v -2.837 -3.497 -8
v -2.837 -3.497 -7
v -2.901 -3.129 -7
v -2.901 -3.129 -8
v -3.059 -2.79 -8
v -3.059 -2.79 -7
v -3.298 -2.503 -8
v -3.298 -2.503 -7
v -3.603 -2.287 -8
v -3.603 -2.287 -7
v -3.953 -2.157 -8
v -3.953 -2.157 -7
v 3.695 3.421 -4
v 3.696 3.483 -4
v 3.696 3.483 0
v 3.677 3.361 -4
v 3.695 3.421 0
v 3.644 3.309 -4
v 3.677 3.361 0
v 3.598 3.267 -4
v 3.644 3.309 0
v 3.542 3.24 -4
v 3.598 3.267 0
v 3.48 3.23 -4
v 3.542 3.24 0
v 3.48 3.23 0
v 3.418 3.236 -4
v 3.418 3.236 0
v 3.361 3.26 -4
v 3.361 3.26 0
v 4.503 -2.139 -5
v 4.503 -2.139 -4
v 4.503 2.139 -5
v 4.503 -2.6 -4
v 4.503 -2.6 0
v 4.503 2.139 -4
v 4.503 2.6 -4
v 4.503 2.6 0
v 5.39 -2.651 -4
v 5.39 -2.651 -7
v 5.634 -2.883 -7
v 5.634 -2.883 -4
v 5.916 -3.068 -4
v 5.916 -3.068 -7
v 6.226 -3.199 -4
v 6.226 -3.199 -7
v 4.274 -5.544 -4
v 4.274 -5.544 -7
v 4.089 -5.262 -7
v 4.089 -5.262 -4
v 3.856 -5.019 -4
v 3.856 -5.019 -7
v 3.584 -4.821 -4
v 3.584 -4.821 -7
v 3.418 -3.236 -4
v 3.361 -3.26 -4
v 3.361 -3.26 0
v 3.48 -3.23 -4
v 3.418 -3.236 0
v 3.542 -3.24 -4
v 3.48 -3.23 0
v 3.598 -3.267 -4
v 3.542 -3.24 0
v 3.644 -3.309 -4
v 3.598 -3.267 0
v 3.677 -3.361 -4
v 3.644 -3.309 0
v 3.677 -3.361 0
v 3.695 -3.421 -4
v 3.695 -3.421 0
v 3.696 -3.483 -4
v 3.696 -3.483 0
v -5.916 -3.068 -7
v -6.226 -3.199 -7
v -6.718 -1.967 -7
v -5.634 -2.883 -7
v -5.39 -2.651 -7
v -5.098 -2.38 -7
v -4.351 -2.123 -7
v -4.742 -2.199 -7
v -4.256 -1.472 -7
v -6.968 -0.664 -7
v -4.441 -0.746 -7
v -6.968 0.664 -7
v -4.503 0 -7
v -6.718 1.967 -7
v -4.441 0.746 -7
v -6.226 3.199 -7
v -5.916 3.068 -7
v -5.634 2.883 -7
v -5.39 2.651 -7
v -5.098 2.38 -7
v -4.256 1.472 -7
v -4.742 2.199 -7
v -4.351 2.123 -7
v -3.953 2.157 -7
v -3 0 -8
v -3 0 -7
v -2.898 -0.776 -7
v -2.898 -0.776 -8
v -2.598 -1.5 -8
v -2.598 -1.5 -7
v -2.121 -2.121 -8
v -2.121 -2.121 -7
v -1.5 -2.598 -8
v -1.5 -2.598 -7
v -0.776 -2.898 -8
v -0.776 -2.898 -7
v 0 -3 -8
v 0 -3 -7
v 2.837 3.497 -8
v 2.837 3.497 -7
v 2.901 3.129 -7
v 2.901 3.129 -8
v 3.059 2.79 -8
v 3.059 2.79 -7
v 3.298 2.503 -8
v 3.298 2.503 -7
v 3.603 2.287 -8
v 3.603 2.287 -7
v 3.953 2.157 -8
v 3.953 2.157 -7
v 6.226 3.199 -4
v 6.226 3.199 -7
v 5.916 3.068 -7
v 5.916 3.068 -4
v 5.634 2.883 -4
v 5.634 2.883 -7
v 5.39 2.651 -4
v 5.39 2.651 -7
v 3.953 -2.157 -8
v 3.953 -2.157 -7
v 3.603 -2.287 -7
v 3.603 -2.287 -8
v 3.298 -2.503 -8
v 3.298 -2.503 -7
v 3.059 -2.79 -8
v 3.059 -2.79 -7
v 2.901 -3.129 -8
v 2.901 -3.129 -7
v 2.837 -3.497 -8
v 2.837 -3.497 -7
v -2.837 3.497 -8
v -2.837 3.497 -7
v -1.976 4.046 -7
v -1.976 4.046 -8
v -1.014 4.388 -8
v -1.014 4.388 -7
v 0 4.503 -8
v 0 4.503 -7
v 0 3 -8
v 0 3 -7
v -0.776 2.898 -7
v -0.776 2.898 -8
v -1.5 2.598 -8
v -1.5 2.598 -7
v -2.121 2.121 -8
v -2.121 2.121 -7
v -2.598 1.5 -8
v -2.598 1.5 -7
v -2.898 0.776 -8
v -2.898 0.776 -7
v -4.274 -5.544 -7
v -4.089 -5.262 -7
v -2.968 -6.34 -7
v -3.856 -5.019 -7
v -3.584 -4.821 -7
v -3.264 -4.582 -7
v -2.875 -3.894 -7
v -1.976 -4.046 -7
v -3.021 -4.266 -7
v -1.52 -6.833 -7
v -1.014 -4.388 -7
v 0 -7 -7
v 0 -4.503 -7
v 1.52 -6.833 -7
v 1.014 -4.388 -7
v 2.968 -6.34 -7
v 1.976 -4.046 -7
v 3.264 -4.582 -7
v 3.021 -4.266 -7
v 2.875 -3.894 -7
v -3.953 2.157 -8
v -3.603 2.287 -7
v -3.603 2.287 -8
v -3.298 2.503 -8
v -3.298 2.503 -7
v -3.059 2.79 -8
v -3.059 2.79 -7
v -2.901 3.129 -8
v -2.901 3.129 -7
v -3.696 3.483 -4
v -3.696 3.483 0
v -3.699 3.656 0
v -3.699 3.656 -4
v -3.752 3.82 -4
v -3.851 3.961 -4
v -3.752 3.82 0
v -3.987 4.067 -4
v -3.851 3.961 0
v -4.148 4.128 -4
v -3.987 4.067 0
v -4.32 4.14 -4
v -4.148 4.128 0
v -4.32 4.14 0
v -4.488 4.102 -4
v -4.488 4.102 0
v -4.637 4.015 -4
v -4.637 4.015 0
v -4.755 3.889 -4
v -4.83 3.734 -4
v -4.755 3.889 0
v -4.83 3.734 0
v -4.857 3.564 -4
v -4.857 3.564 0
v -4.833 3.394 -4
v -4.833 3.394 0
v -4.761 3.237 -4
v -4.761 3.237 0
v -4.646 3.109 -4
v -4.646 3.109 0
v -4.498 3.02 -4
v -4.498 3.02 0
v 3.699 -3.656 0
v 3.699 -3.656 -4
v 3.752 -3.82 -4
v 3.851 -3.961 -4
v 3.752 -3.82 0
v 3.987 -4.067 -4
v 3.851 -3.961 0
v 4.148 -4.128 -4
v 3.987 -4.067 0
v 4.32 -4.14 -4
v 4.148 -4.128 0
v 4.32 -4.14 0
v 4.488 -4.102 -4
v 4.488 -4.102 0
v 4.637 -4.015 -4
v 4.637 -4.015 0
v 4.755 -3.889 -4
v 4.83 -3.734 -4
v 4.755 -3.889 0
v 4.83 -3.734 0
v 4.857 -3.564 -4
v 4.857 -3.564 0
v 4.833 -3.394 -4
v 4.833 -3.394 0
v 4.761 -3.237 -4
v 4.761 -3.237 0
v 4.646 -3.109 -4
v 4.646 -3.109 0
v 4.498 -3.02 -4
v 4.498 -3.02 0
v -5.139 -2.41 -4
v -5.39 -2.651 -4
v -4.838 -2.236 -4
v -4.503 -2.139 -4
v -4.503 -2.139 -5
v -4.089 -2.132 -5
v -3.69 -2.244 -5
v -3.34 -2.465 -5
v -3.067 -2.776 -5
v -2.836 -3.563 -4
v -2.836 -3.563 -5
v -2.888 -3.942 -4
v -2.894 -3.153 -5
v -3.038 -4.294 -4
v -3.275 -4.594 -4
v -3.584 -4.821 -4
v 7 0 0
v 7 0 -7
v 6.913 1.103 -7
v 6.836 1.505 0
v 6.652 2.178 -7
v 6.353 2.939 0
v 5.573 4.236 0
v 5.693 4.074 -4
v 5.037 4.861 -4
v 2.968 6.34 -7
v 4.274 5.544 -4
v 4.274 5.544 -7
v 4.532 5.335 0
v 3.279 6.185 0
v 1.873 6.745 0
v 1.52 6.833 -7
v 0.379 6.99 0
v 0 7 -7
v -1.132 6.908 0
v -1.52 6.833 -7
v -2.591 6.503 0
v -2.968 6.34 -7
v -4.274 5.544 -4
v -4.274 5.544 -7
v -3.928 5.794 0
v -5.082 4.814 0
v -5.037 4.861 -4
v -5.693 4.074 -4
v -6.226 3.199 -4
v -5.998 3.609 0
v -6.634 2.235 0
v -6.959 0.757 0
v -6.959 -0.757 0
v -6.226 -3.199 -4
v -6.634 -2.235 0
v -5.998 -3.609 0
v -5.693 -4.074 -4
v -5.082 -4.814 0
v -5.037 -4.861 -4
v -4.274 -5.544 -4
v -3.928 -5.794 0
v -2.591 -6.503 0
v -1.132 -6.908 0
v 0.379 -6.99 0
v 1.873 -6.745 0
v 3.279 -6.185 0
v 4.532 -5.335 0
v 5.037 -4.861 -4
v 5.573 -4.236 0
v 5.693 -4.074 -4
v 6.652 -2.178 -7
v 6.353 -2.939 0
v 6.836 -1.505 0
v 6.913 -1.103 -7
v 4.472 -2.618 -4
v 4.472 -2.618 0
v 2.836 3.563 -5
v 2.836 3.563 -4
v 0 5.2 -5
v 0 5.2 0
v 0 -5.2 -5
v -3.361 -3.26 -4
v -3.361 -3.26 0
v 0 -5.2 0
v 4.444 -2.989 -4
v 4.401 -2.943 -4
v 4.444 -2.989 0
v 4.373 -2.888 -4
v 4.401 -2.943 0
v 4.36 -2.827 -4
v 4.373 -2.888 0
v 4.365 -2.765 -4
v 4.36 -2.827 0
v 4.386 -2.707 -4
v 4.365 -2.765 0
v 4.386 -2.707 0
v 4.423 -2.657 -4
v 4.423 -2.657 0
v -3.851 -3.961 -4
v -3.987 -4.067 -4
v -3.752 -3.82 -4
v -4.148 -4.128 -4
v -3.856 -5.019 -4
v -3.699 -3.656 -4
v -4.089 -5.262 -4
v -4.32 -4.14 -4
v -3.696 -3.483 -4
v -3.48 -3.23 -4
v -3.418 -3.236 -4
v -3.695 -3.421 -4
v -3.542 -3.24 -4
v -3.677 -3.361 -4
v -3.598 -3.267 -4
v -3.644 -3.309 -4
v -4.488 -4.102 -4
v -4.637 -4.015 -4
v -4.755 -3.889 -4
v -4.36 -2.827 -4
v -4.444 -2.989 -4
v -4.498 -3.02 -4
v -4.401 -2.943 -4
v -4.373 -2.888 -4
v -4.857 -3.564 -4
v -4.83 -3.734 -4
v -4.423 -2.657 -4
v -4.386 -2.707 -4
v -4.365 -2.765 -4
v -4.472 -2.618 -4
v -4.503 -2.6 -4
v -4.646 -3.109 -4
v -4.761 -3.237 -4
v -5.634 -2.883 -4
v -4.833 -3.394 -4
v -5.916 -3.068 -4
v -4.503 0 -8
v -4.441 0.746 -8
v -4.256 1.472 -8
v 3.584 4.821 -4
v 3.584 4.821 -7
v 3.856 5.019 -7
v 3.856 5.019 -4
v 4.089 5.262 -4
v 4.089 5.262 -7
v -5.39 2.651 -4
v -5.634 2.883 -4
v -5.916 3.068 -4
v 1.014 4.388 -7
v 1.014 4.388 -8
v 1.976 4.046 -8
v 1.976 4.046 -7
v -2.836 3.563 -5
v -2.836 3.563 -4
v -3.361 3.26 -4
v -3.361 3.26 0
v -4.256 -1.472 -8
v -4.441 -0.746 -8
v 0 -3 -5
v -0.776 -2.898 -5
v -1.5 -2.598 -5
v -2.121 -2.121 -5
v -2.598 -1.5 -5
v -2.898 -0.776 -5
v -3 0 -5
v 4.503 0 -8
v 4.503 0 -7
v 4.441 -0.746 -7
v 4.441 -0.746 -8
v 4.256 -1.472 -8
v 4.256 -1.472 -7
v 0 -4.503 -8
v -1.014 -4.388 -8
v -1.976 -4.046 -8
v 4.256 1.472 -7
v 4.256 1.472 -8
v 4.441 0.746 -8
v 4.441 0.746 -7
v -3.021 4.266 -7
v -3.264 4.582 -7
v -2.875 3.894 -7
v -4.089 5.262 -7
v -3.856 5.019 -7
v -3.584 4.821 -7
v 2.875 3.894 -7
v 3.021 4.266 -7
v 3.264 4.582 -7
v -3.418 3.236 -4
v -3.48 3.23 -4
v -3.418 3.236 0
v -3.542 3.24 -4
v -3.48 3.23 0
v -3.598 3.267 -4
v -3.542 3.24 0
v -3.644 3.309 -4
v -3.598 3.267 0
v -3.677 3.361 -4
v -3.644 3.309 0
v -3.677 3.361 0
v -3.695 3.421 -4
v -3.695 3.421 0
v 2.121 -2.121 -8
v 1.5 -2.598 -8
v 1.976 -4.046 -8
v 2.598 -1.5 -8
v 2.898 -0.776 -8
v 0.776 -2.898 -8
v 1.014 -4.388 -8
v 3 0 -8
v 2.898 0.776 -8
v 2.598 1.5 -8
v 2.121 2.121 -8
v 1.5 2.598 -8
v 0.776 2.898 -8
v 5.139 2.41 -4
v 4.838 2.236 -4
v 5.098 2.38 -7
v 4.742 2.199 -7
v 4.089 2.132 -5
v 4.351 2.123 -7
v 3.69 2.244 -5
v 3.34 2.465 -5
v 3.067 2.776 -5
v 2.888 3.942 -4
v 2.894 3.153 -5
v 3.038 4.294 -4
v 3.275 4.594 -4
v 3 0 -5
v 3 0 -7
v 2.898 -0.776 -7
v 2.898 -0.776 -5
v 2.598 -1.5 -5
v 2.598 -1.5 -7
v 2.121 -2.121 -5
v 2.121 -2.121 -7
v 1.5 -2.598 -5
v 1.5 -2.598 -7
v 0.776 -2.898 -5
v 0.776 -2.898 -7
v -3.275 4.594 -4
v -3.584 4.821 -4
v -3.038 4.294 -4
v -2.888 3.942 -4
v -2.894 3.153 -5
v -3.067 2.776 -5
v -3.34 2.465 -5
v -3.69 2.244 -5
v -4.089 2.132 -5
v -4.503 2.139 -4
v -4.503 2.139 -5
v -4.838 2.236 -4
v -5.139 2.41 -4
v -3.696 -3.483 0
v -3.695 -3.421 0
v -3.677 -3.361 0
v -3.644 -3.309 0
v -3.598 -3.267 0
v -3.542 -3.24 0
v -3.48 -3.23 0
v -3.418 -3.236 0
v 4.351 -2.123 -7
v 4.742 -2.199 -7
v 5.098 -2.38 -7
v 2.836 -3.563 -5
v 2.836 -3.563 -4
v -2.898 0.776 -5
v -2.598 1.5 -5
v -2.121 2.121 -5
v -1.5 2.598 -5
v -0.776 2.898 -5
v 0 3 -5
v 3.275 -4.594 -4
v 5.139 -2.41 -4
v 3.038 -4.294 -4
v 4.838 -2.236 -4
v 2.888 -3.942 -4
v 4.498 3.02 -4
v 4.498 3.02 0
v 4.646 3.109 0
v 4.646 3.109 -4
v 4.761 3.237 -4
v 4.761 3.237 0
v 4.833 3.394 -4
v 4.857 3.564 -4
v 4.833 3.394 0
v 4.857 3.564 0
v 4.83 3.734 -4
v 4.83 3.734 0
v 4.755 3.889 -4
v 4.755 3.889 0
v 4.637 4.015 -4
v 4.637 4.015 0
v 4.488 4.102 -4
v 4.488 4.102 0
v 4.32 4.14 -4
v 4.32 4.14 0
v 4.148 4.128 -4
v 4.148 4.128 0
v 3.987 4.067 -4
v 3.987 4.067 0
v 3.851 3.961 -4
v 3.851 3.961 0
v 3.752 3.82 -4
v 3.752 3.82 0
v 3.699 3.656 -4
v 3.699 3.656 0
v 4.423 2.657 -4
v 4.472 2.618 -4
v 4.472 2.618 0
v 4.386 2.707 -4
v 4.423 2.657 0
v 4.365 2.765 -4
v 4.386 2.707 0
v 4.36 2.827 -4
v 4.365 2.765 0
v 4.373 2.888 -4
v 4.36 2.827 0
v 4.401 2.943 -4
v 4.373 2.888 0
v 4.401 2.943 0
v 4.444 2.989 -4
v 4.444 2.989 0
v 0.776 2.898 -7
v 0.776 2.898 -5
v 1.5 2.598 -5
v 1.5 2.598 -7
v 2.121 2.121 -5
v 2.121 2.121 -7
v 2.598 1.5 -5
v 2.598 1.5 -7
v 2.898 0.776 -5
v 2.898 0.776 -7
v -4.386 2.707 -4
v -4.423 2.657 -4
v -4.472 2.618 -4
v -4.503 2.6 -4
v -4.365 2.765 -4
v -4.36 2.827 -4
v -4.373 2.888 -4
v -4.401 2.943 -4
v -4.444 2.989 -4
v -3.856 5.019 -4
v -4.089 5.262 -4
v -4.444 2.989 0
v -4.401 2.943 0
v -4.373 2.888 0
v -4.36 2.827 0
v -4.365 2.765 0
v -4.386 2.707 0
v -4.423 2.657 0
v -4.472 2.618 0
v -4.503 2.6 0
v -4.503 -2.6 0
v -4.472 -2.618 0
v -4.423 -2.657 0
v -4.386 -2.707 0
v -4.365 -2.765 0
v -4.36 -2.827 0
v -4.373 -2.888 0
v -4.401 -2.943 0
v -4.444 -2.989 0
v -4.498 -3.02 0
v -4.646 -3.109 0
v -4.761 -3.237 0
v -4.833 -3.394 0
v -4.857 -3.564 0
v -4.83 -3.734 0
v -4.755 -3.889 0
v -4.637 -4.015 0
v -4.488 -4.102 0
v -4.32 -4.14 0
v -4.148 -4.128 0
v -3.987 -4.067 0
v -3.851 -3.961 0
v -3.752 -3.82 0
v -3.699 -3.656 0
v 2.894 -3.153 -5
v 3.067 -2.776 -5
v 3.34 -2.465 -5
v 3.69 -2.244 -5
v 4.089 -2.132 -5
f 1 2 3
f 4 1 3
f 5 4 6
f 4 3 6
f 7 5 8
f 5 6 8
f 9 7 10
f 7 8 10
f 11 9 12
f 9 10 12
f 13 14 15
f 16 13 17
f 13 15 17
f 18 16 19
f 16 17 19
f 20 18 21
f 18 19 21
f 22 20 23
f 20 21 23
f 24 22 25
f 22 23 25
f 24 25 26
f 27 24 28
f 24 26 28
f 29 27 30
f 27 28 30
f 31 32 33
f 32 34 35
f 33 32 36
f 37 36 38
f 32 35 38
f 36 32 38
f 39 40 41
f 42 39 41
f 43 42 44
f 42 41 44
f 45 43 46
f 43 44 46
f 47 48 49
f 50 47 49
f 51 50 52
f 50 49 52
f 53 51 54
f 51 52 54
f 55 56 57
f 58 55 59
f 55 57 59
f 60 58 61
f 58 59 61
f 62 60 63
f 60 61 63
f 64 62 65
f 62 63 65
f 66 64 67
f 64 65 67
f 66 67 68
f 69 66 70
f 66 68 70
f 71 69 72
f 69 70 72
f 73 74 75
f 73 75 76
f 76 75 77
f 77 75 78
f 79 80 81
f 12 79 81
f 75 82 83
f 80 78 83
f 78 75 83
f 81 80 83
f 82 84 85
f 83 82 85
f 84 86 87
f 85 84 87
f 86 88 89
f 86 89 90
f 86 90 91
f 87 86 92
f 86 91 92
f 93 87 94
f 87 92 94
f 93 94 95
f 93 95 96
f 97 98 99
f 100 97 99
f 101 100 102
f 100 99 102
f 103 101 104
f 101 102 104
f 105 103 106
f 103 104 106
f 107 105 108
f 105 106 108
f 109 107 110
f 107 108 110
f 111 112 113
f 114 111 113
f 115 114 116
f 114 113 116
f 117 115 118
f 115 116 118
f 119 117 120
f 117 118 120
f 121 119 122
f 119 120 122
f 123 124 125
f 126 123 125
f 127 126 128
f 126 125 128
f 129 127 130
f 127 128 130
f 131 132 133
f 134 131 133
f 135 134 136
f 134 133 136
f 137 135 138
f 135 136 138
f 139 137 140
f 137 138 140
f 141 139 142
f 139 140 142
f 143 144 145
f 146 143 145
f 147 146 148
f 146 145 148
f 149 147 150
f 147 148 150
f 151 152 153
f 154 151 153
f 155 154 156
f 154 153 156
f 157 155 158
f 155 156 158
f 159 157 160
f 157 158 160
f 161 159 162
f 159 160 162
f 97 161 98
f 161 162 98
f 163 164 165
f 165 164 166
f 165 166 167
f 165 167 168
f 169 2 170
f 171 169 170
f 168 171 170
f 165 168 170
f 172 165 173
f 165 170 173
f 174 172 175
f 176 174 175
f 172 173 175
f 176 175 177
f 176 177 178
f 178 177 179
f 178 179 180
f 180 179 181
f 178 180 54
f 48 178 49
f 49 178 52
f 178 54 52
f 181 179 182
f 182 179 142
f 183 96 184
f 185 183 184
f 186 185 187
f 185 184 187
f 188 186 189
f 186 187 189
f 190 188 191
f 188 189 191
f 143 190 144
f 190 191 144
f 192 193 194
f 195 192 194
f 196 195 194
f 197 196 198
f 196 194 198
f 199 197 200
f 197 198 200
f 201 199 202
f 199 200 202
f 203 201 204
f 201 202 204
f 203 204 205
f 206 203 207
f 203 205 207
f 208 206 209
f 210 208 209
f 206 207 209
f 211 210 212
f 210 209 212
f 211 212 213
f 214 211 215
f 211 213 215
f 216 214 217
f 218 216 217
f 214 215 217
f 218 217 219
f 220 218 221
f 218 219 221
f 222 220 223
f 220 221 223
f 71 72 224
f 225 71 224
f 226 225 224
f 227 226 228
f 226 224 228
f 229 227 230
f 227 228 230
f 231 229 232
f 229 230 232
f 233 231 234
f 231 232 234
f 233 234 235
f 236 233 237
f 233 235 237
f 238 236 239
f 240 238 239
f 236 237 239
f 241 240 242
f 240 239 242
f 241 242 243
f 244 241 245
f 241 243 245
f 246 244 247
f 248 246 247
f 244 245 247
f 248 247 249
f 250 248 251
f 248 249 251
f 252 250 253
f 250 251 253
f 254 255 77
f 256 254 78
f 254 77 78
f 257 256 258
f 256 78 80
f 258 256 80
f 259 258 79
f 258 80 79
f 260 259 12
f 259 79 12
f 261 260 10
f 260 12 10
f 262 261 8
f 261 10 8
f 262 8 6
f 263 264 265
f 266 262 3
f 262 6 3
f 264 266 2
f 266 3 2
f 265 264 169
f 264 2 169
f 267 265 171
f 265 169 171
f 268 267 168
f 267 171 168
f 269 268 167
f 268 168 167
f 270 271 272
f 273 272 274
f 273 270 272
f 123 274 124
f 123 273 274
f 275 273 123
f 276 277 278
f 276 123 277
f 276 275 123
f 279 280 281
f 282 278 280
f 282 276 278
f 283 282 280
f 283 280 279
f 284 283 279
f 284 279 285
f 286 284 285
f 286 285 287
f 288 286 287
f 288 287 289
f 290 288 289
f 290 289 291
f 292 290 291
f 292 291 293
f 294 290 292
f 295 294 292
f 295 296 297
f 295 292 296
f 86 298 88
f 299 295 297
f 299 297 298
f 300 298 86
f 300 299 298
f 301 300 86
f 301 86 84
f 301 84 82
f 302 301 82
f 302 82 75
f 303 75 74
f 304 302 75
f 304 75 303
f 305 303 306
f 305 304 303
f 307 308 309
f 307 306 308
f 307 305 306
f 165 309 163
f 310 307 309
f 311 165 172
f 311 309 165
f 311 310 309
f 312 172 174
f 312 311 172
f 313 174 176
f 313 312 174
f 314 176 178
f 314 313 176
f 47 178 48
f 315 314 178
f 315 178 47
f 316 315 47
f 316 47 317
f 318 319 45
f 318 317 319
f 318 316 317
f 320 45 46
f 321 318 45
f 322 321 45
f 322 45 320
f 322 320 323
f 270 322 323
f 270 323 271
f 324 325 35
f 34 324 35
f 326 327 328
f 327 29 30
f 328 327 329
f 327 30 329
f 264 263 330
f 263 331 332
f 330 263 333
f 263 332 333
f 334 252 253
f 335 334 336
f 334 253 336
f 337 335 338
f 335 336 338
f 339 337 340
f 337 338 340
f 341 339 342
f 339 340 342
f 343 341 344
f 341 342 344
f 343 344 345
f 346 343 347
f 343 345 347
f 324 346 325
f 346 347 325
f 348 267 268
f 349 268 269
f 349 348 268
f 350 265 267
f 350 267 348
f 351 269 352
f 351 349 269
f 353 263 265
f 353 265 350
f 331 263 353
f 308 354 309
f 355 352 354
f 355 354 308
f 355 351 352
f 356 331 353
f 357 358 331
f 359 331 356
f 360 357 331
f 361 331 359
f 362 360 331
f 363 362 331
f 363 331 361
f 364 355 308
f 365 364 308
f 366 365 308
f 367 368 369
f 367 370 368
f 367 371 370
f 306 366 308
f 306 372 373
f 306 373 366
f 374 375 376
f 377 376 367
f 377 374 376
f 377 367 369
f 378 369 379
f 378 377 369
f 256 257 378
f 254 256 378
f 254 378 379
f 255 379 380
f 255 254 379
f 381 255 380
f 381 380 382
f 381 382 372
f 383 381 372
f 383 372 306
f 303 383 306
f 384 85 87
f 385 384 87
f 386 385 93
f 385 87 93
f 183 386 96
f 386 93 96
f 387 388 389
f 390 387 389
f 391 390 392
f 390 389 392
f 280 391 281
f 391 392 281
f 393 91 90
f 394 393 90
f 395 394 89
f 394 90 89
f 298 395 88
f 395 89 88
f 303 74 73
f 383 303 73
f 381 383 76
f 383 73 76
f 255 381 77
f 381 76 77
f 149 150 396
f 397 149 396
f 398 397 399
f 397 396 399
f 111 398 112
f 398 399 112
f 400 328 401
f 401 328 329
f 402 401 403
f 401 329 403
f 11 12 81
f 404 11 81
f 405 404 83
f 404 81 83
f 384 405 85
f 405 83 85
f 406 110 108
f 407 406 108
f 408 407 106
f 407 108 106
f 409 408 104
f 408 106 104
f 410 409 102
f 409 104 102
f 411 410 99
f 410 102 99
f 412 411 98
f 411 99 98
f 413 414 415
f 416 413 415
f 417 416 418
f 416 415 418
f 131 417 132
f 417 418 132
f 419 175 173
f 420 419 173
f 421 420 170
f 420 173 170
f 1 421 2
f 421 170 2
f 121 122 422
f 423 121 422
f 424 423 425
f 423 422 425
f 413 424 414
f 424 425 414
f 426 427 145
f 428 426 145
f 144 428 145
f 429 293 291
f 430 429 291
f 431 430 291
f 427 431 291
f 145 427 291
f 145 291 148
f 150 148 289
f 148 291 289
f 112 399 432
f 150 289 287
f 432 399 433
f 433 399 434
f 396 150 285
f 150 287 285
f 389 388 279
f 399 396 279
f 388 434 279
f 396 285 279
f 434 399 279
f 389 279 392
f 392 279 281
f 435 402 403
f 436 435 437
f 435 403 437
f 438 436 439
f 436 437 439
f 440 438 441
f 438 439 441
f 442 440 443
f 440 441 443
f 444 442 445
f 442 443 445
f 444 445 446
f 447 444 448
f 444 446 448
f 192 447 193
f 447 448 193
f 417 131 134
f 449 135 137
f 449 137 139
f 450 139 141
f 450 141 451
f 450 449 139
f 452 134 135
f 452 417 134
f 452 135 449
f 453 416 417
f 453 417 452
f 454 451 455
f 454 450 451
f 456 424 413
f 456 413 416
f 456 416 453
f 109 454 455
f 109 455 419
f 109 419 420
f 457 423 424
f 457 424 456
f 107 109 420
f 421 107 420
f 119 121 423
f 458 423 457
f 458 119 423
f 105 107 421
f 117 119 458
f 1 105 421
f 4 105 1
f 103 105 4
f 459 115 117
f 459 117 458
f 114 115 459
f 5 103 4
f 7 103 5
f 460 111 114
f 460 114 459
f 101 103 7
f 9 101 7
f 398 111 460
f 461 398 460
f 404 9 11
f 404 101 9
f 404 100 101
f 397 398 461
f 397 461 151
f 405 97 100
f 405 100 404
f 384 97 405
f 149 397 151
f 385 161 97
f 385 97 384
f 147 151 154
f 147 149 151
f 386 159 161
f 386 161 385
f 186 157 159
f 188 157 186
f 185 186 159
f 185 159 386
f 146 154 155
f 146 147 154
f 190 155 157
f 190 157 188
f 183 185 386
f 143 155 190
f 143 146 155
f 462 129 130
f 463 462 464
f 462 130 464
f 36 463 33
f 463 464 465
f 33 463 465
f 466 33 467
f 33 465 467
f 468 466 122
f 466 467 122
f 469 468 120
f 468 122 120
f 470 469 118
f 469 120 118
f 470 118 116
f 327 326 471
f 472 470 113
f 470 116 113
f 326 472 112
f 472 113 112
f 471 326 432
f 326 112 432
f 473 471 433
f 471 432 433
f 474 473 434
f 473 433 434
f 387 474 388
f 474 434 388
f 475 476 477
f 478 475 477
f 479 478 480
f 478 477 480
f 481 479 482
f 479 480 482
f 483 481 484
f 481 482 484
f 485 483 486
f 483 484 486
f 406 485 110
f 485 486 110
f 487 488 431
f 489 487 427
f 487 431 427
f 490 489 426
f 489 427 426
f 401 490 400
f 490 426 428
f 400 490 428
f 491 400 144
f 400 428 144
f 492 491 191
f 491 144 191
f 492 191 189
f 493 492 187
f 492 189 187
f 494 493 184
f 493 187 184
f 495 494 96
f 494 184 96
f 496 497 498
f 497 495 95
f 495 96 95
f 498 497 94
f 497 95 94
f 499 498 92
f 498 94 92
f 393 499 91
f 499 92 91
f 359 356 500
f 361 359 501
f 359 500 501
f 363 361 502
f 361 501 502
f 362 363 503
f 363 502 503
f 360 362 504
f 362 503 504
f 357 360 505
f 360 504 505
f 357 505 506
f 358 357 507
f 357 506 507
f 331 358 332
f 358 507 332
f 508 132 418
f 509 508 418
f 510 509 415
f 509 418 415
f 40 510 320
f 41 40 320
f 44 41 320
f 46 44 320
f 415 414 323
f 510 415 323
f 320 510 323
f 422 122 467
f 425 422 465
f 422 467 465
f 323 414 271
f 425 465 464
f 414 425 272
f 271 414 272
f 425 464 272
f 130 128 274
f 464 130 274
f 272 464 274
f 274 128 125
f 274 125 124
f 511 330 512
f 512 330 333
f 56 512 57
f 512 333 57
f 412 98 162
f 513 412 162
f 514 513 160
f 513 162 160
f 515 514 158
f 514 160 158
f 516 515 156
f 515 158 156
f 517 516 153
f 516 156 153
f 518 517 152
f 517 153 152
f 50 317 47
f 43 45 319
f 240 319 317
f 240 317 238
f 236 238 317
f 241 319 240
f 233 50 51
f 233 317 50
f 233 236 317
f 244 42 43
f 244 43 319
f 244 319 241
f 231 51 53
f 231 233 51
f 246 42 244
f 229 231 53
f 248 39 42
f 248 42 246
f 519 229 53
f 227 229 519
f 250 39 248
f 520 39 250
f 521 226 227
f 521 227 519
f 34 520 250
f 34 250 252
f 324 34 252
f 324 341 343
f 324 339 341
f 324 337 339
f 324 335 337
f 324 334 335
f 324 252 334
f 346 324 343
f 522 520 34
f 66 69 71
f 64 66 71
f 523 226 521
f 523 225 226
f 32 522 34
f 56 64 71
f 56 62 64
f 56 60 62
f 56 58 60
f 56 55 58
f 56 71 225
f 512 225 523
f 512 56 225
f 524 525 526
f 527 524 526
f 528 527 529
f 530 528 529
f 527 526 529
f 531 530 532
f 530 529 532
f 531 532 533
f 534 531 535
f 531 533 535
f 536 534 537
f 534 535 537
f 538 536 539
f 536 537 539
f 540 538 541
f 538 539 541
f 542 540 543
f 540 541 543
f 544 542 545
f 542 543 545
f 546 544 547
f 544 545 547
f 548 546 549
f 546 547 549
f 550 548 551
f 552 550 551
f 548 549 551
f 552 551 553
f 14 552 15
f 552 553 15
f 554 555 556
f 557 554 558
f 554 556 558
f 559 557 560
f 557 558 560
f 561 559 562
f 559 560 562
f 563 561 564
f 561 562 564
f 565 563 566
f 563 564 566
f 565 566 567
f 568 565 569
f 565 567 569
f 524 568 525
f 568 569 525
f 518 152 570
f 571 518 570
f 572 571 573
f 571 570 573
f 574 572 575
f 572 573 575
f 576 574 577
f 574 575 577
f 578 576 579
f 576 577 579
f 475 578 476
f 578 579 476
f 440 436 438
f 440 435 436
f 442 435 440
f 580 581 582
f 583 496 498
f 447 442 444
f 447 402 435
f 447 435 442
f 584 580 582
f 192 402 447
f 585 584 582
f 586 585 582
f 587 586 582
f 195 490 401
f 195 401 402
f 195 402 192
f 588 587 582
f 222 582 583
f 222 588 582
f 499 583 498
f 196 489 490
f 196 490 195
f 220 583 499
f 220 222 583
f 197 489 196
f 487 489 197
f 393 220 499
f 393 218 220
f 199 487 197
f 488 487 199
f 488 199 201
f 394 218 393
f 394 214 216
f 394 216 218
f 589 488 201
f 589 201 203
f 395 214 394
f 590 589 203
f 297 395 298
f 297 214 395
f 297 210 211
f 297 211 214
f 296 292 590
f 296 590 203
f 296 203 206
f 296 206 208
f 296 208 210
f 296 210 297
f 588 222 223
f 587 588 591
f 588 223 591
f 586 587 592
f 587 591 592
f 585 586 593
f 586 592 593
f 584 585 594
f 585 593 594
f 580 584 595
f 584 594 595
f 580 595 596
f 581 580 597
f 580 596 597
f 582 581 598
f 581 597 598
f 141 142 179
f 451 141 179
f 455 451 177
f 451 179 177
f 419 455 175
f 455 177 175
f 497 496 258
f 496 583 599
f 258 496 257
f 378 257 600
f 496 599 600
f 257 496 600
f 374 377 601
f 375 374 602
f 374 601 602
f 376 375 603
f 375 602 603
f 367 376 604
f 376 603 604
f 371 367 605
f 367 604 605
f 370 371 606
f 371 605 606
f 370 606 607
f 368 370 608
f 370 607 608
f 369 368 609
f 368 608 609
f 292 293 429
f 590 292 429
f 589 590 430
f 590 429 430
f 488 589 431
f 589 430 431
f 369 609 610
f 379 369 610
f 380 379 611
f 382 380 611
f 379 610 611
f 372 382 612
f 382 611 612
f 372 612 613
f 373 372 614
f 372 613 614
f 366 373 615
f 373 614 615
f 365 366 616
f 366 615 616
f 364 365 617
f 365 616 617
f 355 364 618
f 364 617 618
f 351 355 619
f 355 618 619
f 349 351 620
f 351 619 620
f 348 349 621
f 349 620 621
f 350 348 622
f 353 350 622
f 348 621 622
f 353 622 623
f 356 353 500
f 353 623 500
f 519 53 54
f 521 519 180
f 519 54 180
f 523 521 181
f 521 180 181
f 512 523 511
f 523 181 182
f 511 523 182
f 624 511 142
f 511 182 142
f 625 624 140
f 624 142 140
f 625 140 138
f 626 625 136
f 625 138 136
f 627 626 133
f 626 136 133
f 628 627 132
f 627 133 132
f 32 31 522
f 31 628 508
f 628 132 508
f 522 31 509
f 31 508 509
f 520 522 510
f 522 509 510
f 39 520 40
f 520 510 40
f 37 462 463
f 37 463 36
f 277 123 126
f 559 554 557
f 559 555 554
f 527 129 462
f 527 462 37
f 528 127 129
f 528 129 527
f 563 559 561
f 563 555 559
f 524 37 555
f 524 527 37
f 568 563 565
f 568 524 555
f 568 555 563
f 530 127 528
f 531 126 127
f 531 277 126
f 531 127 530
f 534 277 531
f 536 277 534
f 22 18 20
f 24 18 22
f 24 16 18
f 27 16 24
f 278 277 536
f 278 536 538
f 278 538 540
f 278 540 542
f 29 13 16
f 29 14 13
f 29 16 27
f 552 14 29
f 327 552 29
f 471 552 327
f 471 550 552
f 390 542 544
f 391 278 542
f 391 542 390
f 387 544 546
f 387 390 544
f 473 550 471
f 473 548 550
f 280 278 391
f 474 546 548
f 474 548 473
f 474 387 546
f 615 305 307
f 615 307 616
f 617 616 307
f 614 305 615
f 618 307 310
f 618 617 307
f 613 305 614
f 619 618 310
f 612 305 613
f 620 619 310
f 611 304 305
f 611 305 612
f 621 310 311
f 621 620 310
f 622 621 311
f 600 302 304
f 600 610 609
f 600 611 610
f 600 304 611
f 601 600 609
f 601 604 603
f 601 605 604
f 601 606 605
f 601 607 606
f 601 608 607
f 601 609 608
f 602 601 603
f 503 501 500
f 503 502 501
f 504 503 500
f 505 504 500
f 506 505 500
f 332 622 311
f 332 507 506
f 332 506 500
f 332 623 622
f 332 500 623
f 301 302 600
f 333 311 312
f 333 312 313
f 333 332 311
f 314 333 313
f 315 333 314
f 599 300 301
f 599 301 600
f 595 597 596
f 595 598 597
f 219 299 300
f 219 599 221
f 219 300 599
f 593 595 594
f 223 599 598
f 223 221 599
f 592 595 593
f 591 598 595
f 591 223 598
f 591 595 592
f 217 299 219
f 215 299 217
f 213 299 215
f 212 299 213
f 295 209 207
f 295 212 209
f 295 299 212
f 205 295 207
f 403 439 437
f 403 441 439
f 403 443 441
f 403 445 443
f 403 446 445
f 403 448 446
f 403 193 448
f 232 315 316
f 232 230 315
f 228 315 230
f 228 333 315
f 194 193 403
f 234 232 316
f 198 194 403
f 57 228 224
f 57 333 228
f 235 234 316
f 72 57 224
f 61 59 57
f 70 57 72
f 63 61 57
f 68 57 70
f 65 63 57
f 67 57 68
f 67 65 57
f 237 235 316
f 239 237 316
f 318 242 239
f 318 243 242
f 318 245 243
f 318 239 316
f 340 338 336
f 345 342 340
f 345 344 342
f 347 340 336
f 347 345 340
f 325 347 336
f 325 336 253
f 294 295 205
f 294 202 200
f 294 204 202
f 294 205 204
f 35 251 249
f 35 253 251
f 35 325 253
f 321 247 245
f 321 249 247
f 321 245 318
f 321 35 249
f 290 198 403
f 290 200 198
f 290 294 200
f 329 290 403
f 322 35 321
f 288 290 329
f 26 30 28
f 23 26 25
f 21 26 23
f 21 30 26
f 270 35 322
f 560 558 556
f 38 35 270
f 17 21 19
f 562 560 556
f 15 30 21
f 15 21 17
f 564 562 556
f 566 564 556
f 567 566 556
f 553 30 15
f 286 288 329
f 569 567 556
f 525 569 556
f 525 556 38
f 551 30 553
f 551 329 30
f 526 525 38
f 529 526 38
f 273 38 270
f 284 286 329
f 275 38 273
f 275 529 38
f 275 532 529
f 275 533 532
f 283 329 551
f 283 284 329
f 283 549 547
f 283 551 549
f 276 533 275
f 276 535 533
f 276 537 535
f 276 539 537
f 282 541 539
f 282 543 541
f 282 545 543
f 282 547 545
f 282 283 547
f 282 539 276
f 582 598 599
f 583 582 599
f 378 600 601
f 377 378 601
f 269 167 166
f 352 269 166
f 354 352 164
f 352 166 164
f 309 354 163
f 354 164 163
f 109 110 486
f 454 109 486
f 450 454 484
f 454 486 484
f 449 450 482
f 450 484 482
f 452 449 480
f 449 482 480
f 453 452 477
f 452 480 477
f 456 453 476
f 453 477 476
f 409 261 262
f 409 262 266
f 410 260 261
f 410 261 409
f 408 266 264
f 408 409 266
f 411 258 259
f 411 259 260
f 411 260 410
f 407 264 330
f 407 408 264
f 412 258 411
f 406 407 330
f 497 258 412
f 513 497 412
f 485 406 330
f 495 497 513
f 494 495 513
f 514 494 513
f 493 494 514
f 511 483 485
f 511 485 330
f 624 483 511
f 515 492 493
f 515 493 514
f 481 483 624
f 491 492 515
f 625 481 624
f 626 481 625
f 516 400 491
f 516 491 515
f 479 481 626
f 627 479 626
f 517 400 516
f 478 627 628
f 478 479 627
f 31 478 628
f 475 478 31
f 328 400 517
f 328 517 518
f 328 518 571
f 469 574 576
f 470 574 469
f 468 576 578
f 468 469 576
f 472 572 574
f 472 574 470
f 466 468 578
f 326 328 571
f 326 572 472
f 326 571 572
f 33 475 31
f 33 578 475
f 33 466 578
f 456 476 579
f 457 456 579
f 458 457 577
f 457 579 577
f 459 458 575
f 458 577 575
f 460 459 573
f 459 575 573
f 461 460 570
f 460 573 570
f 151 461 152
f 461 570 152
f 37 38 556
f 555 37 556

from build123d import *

# Parameters (mm, degrees)
SKETCH1_R               = 7
BOSS_EXTRUDE1_DEPTH     = 7
SKETCH4_R               = 3
BOSS_EXTRUDE2_DEPTH     = 1
CUT_EXTRUDE4_START      = -3
CUT_EXTRUDE4_DEPTH      = 3
CUT_EXTRUDE5_DEPTH      = 5
CUT_EXTRUDE6_DEPTH      = 5
CUT_EXTRUDE7_DEPTH      = 13.124355653
CUT_EXTRUDE7_DEPTH_BACK = 13.124355653
SKETCH4_4_R             = 3


with BuildPart() as part:
    # Sketch1 → Boss-Extrude1 (new body)
    with BuildSketch(Plane.XY):
        Circle(SKETCH1_R)
    extrude(amount=-BOSS_EXTRUDE1_DEPTH)

    # Sketch4 → Boss-Extrude2 (add)
    with BuildSketch(Plane(origin=(0, 0, -7), x_dir=(-1, 0, 0), z_dir=(0, 0, -1))):
        with BuildLine():
            ThreePointArc((2.837096154, 3.497268279), (0, 4.5033321), (-2.837096154, 3.497268279))
            ThreePointArc((-2.837096154, 3.497268279), (-3.168771964, 2.638481586), (-3.953282021, 2.156747845))
            ThreePointArc((-3.953282021, 2.156747845), (-4.5033321, 0), (-3.953282021, -2.156747845))
            ThreePointArc((-3.953282021, -2.156747845), (-3.168771964, -2.638481586), (-2.837096154, -3.497268279))
            ThreePointArc((-2.837096154, -3.497268279), (0, -4.5033321), (2.837096154, -3.497268279))
            ThreePointArc((2.837096154, -3.497268279), (3.168771964, -2.638481586), (3.953282021, -2.156747845))
            ThreePointArc((3.953282021, -2.156747845), (4.5033321, 0), (3.953282021, 2.156747845))
            ThreePointArc((3.953282021, 2.156747845), (3.168771964, 2.638481586), (2.837096154, 3.497268279))
        make_face()
        Circle(SKETCH4_R, mode=Mode.SUBTRACT)
    extrude(amount=BOSS_EXTRUDE2_DEPTH)

    # Sketch4<3> → Cut-Extrude4 (cut)
    with BuildSketch(Plane(origin=(0, 0, -7), x_dir=(-1, 0, 0), z_dir=(0, 0, -1)).offset(CUT_EXTRUDE4_START)):
        with BuildLine():
            ThreePointArc((4.274062643, 5.543680052), (3.977849472, 5.135421007), (3.583758725, 4.820603323))
            ThreePointArc((3.583758725, 4.820603323), (3.168771964, 2.638481586), (5.389966001, 2.651378794))
            ThreePointArc((5.389966001, 2.651378794), (5.770954662, 2.981931862), (6.226111662, 3.199302046))
            ThreePointArc((6.226111662, 3.199302046), (5.379353322, 4.479124673), (4.274062643, 5.543680052))
        make_face()
        with BuildLine():
            ThreePointArc((-3.583758725, 4.820603323), (-3.977849472, 5.135421007), (-4.274062643, 5.543680052))
            ThreePointArc((-4.274062643, 5.543680052), (-5.379353322, 4.479124673), (-6.226111662, 3.199302046))
            ThreePointArc((-6.226111662, 3.199302046), (-5.770954662, 2.981931862), (-5.389966001, 2.651378794))
            ThreePointArc((-5.389966001, 2.651378794), (-3.168771964, 2.638481586), (-3.583758725, 4.820603323))
        make_face()
        with BuildLine():
            ThreePointArc((3.583758725, -4.820603323), (3.977849472, -5.135421007), (4.274062643, -5.543680052))
            ThreePointArc((4.274062643, -5.543680052), (5.379353322, -4.479124673), (6.226111662, -3.199302046))
            ThreePointArc((6.226111662, -3.199302046), (5.770954662, -2.981931862), (5.389966001, -2.651378794))
            ThreePointArc((5.389966001, -2.651378794), (3.168771964, -2.638481586), (3.583758725, -4.820603323))
        make_face()
        with BuildLine():
            ThreePointArc((-5.389966001, -2.651378794), (-5.770954662, -2.981931862), (-6.226111662, -3.199302046))
            ThreePointArc((-6.226111662, -3.199302046), (-5.379353322, -4.479124673), (-4.274062643, -5.543680052))
            ThreePointArc((-4.274062643, -5.543680052), (-3.977849472, -5.135421007), (-3.583758725, -4.820603323))
            ThreePointArc((-3.583758725, -4.820603323), (-3.168771964, -2.638481586), (-5.389966001, -2.651378794))
        make_face()
    extrude(amount=CUT_EXTRUDE4_DEPTH, mode=Mode.SUBTRACT)

    # Sketch1<5> → Cut-Extrude5 (cut)
    with BuildSketch(Plane.XY):
        Polygon((-3.360638375, -3.259734529), (0, -5.2), (3.360638375, -3.259734529), (4.471773772, -2.618220209), (4.5033321, -2.6), (4.5033321, 2.6), (4.471773772, 2.618220209), (3.360638375, 3.259734529), (0, 5.2), (-3.360638375, 3.259734529), (-4.471773772, 2.618220209), (-4.5033321, 2.6), (-4.5033321, -2.6), (-4.471773772, -2.618220209), align=None)
    extrude(amount=-CUT_EXTRUDE5_DEPTH, mode=Mode.SUBTRACT)

    # Sketch1<6> → Cut-Extrude6 (cut)
    with BuildSketch(Plane.XY):
        with BuildLine():
            Line((4.471773772, -2.618220209), (3.360638375, -3.259734529))
            ThreePointArc((3.360638375, -3.259734529), (3.597609587, -3.267426216), (3.695640854, -3.483306711))
            ThreePointArc((3.695640854, -3.483306711), (4.565726609, -4.063979936), (4.497891721, -3.020126957))
            ThreePointArc((4.497891721, -3.020126957), (4.359949362, -2.827289142), (4.471773772, -2.618220209))
        make_face()
        with BuildLine():
            ThreePointArc((-3.695640854, -3.483306711), (-3.597609587, -3.267426216), (-3.360638375, -3.259734529))
            Line((-3.360638375, -3.259734529), (-4.471773772, -2.618220209))
            ThreePointArc((-4.471773772, -2.618220209), (-4.359949362, -2.827289142), (-4.497891721, -3.020126957))
            ThreePointArc((-4.497891721, -3.020126957), (-4.565726609, -4.063979936), (-3.695640854, -3.483306711))
        make_face()
        with BuildLine():
            Line((3.360638375, 3.259734529), (4.471773772, 2.618220209))
            ThreePointArc((4.471773772, 2.618220209), (4.359949362, 2.827289142), (4.497891721, 3.020126957))
            ThreePointArc((4.497891721, 3.020126957), (4.565726609, 4.063979936), (3.695640854, 3.483306711))
            ThreePointArc((3.695640854, 3.483306711), (3.597609587, 3.267426216), (3.360638375, 3.259734529))
        make_face()
        with BuildLine():
            ThreePointArc((-4.497891721, 3.020126957), (-4.359949362, 2.827289142), (-4.471773772, 2.618220209))
            Line((-4.471773772, 2.618220209), (-3.360638375, 3.259734529))
            ThreePointArc((-3.360638375, 3.259734529), (-3.597609587, 3.267426216), (-3.695640854, 3.483306711))
            ThreePointArc((-3.695640854, 3.483306711), (-4.565726609, 4.063979936), (-4.497891721, 3.020126957))
        make_face()
    extrude(amount=-CUT_EXTRUDE6_DEPTH, mode=Mode.SUBTRACT)

    # Sketch4<4> → Cut-Extrude7 (cut, two sides: drawn at the far end of the back side and taken through both)
    with BuildSketch(Plane(origin=(0, 0, -7), x_dir=(-1, 0, 0), z_dir=(0, 0, -1)).offset(-CUT_EXTRUDE7_DEPTH_BACK)):
        Circle(SKETCH4_4_R)
    extrude(amount=CUT_EXTRUDE7_DEPTH + CUT_EXTRUDE7_DEPTH_BACK, mode=Mode.SUBTRACT)


solid = part.part
